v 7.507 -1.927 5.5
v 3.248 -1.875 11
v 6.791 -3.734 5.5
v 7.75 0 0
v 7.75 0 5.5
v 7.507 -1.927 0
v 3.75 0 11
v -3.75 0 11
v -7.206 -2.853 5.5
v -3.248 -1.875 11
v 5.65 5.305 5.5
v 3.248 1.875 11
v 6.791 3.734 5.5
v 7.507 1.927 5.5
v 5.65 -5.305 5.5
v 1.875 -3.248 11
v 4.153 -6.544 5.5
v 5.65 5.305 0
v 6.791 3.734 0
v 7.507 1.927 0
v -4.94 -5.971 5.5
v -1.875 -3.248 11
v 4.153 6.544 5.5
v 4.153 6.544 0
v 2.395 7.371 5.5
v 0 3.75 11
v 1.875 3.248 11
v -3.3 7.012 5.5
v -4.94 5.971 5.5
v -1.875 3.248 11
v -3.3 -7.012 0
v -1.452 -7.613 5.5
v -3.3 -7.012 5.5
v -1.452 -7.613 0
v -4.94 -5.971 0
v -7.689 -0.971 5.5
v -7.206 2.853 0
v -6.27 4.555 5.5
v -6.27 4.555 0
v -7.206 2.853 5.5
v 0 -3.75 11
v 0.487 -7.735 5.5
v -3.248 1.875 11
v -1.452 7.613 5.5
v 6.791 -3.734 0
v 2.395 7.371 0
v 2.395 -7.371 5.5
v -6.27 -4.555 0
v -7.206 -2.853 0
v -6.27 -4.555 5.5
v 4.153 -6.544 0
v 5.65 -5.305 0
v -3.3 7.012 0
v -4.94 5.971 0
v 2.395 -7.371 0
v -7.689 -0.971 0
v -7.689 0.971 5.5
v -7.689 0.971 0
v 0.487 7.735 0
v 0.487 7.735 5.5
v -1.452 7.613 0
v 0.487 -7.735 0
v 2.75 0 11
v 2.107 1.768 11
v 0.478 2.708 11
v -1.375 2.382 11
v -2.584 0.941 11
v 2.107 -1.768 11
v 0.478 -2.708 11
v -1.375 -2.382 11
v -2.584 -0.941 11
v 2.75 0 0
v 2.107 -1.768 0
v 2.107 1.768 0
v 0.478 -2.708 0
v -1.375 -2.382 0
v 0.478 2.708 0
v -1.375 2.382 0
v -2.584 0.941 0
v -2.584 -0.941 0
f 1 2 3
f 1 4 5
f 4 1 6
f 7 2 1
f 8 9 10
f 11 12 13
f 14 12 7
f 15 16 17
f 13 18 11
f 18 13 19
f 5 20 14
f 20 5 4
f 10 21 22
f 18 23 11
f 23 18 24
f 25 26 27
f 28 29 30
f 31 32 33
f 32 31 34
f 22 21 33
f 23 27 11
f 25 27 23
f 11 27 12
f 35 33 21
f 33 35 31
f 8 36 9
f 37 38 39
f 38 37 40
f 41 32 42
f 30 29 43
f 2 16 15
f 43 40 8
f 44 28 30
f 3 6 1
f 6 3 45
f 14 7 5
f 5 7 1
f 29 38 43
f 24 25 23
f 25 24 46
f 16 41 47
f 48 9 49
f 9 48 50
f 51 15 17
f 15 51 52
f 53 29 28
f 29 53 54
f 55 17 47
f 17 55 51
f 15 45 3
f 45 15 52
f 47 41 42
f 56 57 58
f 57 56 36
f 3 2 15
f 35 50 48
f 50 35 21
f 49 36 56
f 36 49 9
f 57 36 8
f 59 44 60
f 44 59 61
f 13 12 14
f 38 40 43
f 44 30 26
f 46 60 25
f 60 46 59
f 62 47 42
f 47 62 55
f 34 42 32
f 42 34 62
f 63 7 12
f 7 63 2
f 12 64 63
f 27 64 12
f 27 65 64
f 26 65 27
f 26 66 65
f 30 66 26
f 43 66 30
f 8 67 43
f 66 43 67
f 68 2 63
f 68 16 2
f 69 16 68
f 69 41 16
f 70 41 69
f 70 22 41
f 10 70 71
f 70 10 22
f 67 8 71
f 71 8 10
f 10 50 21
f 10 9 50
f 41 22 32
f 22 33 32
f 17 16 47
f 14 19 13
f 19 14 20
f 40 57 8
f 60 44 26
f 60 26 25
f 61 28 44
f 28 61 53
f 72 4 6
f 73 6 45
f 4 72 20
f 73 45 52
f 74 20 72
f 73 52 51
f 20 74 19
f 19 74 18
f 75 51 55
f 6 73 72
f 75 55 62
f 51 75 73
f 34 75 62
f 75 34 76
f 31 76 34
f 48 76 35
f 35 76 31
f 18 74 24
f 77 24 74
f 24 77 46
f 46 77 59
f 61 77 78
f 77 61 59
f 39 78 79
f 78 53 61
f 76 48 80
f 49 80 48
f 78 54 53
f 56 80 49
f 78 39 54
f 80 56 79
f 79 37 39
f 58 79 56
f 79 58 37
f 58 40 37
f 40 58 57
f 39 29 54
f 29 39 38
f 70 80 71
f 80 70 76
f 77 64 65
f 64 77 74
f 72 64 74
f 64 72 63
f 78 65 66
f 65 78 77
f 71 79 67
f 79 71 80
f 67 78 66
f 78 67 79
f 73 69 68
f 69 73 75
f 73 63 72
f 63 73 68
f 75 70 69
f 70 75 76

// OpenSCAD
// Uncomment before final render
//$fa = 0.01;
//$fs = 0.25;

module xAxisRollerSpacer () {
  difference() {
    hull() {
      cylinder(5.5, 7.75, 7.75);
      translate([0, 0, 5.5]) {
        cylinder(5.5, 3.75, 3.75);
      }
    }
    translate([0, 0, -1]) {
      cylinder(13, 2.75, 2.75);
    }
  }
}

xAxisRollerSpacer();
